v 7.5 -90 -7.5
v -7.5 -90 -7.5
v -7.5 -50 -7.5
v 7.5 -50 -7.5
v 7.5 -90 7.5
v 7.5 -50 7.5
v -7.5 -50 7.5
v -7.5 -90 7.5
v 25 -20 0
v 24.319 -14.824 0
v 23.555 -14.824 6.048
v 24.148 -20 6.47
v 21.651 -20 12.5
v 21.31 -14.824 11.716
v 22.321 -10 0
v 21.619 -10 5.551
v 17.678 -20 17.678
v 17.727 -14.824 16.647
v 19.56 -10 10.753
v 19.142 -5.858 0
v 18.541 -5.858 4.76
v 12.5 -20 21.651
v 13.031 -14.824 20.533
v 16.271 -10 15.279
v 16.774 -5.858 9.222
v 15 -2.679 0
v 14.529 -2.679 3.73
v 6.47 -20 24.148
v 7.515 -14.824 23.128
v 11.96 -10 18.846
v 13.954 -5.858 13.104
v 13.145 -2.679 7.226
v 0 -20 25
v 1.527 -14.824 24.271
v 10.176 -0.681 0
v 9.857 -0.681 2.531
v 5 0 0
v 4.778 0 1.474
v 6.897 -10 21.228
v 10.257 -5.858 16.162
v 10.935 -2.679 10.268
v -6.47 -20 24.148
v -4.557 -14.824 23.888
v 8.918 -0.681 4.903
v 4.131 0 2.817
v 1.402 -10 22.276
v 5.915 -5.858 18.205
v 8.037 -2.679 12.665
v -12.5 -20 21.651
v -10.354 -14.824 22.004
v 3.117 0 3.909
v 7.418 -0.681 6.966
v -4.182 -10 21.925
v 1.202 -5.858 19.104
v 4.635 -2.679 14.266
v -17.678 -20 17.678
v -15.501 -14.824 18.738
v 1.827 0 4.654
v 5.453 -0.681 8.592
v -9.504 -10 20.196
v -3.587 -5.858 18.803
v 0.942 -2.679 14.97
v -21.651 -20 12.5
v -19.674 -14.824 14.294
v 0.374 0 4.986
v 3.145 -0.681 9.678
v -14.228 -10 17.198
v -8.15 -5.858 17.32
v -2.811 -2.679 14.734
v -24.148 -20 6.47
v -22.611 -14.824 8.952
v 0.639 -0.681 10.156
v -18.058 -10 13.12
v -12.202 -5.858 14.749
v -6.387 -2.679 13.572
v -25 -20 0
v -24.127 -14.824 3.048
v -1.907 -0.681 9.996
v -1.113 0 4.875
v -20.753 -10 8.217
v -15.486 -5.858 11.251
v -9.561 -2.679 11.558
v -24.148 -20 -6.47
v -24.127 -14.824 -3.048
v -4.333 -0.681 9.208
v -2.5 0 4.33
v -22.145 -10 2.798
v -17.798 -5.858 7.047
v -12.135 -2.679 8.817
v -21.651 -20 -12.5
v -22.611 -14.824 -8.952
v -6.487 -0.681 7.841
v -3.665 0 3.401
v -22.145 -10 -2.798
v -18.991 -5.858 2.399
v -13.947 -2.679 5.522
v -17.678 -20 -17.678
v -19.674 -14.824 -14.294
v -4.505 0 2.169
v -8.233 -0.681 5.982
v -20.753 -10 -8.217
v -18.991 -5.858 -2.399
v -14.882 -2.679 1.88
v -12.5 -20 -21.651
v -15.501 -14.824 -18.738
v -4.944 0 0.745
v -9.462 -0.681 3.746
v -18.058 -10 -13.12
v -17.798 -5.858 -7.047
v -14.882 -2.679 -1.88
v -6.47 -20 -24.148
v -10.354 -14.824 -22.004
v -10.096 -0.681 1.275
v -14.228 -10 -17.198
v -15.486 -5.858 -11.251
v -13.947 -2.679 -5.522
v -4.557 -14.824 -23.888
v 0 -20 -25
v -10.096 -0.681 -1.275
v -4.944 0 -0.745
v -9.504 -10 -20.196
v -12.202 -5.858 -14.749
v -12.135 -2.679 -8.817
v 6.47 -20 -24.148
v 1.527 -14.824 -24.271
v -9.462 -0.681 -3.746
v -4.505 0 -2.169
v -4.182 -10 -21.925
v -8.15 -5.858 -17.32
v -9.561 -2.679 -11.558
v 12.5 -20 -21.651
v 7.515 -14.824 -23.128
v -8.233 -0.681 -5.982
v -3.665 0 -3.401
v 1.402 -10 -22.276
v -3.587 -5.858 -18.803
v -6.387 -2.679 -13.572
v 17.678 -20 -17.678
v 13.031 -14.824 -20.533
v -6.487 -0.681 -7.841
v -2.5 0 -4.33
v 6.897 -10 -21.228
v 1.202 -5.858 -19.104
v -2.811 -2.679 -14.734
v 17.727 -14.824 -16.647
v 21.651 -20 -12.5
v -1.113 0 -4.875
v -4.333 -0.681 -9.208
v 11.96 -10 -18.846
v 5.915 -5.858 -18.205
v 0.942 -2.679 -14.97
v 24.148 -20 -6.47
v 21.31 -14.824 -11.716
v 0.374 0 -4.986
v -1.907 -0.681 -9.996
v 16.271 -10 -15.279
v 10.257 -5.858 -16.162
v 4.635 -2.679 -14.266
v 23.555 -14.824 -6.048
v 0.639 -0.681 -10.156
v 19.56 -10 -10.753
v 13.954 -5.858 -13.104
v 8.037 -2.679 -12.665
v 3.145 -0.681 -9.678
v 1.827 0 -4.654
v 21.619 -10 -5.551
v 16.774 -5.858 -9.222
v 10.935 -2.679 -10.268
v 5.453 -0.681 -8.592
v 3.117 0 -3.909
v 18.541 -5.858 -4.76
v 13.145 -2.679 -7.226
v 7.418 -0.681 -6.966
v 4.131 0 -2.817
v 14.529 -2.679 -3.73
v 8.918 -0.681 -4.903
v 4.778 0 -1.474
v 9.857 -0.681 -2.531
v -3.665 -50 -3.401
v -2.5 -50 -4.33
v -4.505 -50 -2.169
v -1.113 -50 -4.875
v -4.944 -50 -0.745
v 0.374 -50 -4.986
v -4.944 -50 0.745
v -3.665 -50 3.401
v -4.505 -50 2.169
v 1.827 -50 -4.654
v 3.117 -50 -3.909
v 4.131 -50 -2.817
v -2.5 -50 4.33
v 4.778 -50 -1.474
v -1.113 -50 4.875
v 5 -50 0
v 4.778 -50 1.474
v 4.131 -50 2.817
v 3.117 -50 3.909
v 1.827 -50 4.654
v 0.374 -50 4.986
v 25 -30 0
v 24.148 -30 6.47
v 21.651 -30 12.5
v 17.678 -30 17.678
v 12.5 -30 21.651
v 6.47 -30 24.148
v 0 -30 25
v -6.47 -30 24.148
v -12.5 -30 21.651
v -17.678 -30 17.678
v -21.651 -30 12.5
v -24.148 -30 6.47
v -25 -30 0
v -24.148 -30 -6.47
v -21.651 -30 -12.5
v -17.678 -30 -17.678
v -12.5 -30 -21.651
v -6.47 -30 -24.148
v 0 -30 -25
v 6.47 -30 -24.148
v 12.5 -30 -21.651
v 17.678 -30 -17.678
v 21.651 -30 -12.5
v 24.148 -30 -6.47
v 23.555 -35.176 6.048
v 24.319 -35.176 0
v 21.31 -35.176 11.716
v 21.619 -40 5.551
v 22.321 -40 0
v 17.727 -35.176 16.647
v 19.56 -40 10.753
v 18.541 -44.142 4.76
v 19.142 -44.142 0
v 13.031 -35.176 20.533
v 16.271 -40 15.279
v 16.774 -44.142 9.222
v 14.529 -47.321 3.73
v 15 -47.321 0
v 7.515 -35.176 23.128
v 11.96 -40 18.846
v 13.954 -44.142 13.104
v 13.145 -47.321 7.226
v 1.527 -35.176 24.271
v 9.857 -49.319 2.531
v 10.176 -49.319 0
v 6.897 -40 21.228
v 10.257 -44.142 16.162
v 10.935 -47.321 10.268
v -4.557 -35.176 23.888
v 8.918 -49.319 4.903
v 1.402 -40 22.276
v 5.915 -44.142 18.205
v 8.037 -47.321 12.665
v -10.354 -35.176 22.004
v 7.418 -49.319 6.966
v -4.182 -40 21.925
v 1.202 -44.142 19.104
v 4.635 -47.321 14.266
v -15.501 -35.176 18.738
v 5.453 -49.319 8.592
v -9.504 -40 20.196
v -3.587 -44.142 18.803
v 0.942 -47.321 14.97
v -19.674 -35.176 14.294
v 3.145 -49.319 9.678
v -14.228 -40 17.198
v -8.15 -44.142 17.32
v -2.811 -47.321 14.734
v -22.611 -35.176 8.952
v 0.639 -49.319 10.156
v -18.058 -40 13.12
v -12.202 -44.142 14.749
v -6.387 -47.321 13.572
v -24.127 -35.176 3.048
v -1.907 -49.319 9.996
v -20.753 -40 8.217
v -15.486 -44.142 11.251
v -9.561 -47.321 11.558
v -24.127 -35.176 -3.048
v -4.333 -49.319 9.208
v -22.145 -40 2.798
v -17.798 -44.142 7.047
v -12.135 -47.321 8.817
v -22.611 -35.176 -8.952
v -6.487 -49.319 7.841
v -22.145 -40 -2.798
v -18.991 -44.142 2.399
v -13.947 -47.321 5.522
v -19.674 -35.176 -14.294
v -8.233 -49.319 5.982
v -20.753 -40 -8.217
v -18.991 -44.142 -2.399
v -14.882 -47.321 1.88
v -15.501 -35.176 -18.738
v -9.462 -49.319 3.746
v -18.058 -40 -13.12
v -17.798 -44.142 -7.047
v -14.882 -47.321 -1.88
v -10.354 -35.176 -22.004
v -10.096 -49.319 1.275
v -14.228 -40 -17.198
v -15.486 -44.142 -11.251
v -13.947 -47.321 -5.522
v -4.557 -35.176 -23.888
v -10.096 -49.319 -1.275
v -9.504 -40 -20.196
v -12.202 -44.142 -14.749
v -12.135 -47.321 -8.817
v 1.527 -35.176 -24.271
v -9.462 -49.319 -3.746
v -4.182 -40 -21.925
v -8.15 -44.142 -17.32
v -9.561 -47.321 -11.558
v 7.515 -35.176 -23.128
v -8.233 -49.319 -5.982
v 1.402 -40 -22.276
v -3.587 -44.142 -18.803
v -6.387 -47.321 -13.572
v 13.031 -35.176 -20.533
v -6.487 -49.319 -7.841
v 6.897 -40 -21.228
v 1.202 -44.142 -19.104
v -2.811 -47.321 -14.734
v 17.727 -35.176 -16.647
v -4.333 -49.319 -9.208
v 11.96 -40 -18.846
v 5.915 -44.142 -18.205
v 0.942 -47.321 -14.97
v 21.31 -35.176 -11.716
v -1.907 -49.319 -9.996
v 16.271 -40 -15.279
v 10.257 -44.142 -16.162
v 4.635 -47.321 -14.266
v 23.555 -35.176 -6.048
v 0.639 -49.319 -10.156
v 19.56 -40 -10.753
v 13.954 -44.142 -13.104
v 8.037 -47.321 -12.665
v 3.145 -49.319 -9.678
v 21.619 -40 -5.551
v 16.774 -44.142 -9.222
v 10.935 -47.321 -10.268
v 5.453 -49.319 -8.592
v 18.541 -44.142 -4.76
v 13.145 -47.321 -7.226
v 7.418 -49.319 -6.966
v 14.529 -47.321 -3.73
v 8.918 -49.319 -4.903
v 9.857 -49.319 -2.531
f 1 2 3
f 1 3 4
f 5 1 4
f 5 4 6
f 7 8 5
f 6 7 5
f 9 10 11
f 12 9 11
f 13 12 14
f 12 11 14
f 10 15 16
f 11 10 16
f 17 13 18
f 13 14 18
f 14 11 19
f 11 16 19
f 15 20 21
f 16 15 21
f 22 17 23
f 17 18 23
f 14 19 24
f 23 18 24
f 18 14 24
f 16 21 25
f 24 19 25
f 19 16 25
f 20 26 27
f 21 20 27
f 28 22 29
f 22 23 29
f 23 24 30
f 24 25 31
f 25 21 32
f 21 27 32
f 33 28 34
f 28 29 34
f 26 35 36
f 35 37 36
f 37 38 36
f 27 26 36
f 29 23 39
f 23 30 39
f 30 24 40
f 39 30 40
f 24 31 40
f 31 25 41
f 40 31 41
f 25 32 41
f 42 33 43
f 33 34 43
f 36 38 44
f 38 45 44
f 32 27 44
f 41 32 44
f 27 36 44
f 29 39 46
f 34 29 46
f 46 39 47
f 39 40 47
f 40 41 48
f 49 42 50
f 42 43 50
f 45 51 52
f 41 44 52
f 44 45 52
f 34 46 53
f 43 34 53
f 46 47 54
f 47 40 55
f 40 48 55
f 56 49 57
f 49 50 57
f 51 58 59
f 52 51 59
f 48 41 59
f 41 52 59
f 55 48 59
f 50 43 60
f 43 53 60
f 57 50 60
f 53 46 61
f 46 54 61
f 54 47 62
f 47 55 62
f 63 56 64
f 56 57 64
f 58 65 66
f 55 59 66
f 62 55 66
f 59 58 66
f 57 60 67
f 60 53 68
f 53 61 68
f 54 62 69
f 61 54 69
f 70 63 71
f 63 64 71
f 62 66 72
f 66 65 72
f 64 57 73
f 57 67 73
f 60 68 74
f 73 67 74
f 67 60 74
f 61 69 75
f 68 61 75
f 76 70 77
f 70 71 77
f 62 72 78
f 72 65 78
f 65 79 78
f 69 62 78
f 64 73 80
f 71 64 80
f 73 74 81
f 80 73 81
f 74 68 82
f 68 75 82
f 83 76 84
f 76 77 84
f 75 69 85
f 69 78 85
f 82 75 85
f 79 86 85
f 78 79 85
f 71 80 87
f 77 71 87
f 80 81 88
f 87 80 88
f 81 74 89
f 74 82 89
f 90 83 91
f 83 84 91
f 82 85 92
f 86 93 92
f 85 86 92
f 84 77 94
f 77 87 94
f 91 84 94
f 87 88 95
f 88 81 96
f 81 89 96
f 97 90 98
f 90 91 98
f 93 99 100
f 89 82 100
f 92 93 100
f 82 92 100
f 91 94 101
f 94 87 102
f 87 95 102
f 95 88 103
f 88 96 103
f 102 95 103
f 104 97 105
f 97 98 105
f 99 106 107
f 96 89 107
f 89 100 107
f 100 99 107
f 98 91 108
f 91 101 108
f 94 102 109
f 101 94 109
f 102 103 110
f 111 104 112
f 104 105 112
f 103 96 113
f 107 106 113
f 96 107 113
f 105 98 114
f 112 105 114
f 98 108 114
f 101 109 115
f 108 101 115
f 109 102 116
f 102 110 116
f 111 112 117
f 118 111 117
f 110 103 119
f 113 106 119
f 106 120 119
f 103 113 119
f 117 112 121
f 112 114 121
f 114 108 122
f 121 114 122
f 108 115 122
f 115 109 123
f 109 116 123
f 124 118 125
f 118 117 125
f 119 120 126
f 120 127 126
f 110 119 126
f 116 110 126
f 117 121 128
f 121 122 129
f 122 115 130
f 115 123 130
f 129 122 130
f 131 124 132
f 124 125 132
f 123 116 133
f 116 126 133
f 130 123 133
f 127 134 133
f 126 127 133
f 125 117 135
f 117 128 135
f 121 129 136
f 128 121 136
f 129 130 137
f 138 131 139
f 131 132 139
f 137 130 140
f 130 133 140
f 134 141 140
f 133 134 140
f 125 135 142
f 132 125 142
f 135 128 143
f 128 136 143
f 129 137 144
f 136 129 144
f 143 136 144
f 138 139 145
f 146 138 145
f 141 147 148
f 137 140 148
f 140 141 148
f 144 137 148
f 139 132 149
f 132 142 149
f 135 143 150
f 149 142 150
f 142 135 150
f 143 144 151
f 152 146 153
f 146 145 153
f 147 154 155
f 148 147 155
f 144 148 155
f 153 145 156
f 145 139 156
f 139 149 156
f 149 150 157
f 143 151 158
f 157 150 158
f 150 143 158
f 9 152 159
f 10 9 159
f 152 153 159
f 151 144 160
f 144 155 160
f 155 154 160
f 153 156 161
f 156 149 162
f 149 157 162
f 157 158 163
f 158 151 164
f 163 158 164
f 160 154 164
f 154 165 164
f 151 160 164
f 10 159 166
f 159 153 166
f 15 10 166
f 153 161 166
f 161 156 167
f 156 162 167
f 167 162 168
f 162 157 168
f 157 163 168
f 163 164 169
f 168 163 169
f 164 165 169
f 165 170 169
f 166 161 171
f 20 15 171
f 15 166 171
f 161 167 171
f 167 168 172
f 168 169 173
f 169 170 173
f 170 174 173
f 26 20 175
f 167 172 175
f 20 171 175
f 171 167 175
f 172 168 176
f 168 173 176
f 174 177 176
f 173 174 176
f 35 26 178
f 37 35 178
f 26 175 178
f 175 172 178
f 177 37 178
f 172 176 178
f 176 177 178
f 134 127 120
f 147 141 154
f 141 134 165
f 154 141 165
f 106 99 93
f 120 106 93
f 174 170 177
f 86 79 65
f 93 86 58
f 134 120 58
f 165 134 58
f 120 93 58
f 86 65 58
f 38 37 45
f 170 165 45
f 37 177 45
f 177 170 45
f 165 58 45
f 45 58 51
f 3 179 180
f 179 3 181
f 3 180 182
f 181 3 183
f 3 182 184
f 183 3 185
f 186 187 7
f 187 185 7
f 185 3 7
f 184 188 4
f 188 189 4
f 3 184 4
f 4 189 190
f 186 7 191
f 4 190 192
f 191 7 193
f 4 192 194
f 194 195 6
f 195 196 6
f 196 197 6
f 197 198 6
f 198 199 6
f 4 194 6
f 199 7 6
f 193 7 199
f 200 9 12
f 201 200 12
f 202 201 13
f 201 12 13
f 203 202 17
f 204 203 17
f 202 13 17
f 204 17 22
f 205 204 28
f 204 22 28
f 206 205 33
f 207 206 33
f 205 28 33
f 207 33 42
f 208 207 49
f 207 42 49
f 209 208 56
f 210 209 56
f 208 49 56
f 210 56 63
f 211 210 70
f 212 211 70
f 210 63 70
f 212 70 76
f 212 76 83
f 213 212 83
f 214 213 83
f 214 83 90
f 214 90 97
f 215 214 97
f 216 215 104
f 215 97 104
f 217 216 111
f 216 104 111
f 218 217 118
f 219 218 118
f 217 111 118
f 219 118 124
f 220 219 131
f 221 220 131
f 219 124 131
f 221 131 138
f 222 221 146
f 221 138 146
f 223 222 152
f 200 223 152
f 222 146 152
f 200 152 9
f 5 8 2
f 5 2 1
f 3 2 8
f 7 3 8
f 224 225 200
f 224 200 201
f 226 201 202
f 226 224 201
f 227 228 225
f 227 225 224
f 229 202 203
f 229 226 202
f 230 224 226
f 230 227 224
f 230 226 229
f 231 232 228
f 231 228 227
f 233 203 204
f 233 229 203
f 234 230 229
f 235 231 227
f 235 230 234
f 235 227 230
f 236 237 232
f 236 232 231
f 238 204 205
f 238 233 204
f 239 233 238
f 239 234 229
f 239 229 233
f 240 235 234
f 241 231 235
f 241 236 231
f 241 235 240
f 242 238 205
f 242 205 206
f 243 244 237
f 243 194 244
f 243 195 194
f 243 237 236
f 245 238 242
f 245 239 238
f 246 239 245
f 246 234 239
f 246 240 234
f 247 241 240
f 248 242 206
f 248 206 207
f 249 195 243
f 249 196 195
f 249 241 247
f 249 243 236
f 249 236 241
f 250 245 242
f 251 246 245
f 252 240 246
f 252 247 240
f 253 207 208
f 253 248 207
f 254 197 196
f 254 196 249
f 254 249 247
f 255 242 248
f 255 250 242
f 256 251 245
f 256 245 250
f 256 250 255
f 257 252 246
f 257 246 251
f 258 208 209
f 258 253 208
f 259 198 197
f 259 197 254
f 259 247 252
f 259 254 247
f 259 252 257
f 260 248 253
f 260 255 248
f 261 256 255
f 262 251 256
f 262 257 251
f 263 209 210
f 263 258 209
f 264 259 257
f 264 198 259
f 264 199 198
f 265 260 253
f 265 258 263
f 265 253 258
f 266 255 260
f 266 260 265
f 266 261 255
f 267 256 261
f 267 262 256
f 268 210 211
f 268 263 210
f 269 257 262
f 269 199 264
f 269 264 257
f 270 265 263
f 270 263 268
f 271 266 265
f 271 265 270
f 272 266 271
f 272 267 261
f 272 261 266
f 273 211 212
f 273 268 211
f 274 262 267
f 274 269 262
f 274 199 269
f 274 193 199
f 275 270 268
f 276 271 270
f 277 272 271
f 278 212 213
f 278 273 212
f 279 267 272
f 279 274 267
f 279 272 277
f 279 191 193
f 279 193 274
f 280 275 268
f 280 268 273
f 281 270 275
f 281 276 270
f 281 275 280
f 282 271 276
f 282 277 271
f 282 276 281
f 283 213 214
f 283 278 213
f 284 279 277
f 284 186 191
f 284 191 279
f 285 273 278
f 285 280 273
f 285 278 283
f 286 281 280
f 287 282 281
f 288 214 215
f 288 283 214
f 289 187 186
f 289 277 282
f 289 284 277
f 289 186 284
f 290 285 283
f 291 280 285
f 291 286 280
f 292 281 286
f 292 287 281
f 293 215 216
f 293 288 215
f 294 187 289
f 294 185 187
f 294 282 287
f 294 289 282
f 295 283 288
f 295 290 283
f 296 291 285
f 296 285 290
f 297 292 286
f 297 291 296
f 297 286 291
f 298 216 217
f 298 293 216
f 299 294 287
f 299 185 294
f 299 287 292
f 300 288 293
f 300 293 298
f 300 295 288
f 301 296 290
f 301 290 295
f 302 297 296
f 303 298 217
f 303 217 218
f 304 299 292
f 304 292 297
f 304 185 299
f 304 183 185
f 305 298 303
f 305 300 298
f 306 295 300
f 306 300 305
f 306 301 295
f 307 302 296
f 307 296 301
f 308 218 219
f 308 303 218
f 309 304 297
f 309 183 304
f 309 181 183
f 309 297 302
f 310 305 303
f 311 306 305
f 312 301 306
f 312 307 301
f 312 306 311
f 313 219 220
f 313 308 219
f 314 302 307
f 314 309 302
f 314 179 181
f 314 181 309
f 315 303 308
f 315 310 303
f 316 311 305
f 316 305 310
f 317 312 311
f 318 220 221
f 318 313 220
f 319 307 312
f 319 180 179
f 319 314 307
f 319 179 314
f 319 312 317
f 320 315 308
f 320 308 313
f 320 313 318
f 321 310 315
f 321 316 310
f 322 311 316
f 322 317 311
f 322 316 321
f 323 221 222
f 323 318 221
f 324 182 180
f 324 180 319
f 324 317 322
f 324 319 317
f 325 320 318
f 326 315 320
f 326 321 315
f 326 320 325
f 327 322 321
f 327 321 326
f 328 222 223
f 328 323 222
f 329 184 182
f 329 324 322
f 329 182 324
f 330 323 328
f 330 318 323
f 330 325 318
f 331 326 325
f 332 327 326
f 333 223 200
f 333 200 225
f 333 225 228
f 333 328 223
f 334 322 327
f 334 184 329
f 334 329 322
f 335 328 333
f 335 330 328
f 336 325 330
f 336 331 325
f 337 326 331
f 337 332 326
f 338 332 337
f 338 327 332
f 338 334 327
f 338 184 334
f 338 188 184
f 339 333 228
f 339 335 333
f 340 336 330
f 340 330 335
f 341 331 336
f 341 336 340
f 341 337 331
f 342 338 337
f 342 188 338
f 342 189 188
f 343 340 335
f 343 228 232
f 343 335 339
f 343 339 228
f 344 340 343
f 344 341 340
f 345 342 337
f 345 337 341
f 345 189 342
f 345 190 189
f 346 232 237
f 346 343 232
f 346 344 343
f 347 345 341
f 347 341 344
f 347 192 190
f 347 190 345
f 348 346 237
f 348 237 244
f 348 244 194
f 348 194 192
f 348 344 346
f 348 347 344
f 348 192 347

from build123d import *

# Parameters (mm, degrees)
F0_R     = 25
F1_DEPTH = 50
F3_R     = 20
F4_R     = 20
F5_W     = 15
F5_H     = 15
F6_DEPTH = 40


with BuildPart() as f1:
    # F0 (on Front) → F1 (new body)
    with BuildSketch(Plane.XZ):
        Circle(F0_R)
    extrude(amount=F1_DEPTH)

    # F3
    f3_edges = [f1.edges().sort_by_distance(p)[0] for p in [
        (-25, -50, 0),
    ]]
    fillet(f3_edges, radius=F3_R)

    # F4
    f4_edges = [f1.edges().sort_by_distance(p)[0] for p in [
        (-25, 0, 0),
    ]]
    fillet(f4_edges, radius=F4_R)

    # F5 (on face) → F6 (join)
    with BuildSketch(Plane.XZ.offset(50)):
        Rectangle(F5_W, F5_H)
    extrude(amount=F6_DEPTH)


solid = f1.part
